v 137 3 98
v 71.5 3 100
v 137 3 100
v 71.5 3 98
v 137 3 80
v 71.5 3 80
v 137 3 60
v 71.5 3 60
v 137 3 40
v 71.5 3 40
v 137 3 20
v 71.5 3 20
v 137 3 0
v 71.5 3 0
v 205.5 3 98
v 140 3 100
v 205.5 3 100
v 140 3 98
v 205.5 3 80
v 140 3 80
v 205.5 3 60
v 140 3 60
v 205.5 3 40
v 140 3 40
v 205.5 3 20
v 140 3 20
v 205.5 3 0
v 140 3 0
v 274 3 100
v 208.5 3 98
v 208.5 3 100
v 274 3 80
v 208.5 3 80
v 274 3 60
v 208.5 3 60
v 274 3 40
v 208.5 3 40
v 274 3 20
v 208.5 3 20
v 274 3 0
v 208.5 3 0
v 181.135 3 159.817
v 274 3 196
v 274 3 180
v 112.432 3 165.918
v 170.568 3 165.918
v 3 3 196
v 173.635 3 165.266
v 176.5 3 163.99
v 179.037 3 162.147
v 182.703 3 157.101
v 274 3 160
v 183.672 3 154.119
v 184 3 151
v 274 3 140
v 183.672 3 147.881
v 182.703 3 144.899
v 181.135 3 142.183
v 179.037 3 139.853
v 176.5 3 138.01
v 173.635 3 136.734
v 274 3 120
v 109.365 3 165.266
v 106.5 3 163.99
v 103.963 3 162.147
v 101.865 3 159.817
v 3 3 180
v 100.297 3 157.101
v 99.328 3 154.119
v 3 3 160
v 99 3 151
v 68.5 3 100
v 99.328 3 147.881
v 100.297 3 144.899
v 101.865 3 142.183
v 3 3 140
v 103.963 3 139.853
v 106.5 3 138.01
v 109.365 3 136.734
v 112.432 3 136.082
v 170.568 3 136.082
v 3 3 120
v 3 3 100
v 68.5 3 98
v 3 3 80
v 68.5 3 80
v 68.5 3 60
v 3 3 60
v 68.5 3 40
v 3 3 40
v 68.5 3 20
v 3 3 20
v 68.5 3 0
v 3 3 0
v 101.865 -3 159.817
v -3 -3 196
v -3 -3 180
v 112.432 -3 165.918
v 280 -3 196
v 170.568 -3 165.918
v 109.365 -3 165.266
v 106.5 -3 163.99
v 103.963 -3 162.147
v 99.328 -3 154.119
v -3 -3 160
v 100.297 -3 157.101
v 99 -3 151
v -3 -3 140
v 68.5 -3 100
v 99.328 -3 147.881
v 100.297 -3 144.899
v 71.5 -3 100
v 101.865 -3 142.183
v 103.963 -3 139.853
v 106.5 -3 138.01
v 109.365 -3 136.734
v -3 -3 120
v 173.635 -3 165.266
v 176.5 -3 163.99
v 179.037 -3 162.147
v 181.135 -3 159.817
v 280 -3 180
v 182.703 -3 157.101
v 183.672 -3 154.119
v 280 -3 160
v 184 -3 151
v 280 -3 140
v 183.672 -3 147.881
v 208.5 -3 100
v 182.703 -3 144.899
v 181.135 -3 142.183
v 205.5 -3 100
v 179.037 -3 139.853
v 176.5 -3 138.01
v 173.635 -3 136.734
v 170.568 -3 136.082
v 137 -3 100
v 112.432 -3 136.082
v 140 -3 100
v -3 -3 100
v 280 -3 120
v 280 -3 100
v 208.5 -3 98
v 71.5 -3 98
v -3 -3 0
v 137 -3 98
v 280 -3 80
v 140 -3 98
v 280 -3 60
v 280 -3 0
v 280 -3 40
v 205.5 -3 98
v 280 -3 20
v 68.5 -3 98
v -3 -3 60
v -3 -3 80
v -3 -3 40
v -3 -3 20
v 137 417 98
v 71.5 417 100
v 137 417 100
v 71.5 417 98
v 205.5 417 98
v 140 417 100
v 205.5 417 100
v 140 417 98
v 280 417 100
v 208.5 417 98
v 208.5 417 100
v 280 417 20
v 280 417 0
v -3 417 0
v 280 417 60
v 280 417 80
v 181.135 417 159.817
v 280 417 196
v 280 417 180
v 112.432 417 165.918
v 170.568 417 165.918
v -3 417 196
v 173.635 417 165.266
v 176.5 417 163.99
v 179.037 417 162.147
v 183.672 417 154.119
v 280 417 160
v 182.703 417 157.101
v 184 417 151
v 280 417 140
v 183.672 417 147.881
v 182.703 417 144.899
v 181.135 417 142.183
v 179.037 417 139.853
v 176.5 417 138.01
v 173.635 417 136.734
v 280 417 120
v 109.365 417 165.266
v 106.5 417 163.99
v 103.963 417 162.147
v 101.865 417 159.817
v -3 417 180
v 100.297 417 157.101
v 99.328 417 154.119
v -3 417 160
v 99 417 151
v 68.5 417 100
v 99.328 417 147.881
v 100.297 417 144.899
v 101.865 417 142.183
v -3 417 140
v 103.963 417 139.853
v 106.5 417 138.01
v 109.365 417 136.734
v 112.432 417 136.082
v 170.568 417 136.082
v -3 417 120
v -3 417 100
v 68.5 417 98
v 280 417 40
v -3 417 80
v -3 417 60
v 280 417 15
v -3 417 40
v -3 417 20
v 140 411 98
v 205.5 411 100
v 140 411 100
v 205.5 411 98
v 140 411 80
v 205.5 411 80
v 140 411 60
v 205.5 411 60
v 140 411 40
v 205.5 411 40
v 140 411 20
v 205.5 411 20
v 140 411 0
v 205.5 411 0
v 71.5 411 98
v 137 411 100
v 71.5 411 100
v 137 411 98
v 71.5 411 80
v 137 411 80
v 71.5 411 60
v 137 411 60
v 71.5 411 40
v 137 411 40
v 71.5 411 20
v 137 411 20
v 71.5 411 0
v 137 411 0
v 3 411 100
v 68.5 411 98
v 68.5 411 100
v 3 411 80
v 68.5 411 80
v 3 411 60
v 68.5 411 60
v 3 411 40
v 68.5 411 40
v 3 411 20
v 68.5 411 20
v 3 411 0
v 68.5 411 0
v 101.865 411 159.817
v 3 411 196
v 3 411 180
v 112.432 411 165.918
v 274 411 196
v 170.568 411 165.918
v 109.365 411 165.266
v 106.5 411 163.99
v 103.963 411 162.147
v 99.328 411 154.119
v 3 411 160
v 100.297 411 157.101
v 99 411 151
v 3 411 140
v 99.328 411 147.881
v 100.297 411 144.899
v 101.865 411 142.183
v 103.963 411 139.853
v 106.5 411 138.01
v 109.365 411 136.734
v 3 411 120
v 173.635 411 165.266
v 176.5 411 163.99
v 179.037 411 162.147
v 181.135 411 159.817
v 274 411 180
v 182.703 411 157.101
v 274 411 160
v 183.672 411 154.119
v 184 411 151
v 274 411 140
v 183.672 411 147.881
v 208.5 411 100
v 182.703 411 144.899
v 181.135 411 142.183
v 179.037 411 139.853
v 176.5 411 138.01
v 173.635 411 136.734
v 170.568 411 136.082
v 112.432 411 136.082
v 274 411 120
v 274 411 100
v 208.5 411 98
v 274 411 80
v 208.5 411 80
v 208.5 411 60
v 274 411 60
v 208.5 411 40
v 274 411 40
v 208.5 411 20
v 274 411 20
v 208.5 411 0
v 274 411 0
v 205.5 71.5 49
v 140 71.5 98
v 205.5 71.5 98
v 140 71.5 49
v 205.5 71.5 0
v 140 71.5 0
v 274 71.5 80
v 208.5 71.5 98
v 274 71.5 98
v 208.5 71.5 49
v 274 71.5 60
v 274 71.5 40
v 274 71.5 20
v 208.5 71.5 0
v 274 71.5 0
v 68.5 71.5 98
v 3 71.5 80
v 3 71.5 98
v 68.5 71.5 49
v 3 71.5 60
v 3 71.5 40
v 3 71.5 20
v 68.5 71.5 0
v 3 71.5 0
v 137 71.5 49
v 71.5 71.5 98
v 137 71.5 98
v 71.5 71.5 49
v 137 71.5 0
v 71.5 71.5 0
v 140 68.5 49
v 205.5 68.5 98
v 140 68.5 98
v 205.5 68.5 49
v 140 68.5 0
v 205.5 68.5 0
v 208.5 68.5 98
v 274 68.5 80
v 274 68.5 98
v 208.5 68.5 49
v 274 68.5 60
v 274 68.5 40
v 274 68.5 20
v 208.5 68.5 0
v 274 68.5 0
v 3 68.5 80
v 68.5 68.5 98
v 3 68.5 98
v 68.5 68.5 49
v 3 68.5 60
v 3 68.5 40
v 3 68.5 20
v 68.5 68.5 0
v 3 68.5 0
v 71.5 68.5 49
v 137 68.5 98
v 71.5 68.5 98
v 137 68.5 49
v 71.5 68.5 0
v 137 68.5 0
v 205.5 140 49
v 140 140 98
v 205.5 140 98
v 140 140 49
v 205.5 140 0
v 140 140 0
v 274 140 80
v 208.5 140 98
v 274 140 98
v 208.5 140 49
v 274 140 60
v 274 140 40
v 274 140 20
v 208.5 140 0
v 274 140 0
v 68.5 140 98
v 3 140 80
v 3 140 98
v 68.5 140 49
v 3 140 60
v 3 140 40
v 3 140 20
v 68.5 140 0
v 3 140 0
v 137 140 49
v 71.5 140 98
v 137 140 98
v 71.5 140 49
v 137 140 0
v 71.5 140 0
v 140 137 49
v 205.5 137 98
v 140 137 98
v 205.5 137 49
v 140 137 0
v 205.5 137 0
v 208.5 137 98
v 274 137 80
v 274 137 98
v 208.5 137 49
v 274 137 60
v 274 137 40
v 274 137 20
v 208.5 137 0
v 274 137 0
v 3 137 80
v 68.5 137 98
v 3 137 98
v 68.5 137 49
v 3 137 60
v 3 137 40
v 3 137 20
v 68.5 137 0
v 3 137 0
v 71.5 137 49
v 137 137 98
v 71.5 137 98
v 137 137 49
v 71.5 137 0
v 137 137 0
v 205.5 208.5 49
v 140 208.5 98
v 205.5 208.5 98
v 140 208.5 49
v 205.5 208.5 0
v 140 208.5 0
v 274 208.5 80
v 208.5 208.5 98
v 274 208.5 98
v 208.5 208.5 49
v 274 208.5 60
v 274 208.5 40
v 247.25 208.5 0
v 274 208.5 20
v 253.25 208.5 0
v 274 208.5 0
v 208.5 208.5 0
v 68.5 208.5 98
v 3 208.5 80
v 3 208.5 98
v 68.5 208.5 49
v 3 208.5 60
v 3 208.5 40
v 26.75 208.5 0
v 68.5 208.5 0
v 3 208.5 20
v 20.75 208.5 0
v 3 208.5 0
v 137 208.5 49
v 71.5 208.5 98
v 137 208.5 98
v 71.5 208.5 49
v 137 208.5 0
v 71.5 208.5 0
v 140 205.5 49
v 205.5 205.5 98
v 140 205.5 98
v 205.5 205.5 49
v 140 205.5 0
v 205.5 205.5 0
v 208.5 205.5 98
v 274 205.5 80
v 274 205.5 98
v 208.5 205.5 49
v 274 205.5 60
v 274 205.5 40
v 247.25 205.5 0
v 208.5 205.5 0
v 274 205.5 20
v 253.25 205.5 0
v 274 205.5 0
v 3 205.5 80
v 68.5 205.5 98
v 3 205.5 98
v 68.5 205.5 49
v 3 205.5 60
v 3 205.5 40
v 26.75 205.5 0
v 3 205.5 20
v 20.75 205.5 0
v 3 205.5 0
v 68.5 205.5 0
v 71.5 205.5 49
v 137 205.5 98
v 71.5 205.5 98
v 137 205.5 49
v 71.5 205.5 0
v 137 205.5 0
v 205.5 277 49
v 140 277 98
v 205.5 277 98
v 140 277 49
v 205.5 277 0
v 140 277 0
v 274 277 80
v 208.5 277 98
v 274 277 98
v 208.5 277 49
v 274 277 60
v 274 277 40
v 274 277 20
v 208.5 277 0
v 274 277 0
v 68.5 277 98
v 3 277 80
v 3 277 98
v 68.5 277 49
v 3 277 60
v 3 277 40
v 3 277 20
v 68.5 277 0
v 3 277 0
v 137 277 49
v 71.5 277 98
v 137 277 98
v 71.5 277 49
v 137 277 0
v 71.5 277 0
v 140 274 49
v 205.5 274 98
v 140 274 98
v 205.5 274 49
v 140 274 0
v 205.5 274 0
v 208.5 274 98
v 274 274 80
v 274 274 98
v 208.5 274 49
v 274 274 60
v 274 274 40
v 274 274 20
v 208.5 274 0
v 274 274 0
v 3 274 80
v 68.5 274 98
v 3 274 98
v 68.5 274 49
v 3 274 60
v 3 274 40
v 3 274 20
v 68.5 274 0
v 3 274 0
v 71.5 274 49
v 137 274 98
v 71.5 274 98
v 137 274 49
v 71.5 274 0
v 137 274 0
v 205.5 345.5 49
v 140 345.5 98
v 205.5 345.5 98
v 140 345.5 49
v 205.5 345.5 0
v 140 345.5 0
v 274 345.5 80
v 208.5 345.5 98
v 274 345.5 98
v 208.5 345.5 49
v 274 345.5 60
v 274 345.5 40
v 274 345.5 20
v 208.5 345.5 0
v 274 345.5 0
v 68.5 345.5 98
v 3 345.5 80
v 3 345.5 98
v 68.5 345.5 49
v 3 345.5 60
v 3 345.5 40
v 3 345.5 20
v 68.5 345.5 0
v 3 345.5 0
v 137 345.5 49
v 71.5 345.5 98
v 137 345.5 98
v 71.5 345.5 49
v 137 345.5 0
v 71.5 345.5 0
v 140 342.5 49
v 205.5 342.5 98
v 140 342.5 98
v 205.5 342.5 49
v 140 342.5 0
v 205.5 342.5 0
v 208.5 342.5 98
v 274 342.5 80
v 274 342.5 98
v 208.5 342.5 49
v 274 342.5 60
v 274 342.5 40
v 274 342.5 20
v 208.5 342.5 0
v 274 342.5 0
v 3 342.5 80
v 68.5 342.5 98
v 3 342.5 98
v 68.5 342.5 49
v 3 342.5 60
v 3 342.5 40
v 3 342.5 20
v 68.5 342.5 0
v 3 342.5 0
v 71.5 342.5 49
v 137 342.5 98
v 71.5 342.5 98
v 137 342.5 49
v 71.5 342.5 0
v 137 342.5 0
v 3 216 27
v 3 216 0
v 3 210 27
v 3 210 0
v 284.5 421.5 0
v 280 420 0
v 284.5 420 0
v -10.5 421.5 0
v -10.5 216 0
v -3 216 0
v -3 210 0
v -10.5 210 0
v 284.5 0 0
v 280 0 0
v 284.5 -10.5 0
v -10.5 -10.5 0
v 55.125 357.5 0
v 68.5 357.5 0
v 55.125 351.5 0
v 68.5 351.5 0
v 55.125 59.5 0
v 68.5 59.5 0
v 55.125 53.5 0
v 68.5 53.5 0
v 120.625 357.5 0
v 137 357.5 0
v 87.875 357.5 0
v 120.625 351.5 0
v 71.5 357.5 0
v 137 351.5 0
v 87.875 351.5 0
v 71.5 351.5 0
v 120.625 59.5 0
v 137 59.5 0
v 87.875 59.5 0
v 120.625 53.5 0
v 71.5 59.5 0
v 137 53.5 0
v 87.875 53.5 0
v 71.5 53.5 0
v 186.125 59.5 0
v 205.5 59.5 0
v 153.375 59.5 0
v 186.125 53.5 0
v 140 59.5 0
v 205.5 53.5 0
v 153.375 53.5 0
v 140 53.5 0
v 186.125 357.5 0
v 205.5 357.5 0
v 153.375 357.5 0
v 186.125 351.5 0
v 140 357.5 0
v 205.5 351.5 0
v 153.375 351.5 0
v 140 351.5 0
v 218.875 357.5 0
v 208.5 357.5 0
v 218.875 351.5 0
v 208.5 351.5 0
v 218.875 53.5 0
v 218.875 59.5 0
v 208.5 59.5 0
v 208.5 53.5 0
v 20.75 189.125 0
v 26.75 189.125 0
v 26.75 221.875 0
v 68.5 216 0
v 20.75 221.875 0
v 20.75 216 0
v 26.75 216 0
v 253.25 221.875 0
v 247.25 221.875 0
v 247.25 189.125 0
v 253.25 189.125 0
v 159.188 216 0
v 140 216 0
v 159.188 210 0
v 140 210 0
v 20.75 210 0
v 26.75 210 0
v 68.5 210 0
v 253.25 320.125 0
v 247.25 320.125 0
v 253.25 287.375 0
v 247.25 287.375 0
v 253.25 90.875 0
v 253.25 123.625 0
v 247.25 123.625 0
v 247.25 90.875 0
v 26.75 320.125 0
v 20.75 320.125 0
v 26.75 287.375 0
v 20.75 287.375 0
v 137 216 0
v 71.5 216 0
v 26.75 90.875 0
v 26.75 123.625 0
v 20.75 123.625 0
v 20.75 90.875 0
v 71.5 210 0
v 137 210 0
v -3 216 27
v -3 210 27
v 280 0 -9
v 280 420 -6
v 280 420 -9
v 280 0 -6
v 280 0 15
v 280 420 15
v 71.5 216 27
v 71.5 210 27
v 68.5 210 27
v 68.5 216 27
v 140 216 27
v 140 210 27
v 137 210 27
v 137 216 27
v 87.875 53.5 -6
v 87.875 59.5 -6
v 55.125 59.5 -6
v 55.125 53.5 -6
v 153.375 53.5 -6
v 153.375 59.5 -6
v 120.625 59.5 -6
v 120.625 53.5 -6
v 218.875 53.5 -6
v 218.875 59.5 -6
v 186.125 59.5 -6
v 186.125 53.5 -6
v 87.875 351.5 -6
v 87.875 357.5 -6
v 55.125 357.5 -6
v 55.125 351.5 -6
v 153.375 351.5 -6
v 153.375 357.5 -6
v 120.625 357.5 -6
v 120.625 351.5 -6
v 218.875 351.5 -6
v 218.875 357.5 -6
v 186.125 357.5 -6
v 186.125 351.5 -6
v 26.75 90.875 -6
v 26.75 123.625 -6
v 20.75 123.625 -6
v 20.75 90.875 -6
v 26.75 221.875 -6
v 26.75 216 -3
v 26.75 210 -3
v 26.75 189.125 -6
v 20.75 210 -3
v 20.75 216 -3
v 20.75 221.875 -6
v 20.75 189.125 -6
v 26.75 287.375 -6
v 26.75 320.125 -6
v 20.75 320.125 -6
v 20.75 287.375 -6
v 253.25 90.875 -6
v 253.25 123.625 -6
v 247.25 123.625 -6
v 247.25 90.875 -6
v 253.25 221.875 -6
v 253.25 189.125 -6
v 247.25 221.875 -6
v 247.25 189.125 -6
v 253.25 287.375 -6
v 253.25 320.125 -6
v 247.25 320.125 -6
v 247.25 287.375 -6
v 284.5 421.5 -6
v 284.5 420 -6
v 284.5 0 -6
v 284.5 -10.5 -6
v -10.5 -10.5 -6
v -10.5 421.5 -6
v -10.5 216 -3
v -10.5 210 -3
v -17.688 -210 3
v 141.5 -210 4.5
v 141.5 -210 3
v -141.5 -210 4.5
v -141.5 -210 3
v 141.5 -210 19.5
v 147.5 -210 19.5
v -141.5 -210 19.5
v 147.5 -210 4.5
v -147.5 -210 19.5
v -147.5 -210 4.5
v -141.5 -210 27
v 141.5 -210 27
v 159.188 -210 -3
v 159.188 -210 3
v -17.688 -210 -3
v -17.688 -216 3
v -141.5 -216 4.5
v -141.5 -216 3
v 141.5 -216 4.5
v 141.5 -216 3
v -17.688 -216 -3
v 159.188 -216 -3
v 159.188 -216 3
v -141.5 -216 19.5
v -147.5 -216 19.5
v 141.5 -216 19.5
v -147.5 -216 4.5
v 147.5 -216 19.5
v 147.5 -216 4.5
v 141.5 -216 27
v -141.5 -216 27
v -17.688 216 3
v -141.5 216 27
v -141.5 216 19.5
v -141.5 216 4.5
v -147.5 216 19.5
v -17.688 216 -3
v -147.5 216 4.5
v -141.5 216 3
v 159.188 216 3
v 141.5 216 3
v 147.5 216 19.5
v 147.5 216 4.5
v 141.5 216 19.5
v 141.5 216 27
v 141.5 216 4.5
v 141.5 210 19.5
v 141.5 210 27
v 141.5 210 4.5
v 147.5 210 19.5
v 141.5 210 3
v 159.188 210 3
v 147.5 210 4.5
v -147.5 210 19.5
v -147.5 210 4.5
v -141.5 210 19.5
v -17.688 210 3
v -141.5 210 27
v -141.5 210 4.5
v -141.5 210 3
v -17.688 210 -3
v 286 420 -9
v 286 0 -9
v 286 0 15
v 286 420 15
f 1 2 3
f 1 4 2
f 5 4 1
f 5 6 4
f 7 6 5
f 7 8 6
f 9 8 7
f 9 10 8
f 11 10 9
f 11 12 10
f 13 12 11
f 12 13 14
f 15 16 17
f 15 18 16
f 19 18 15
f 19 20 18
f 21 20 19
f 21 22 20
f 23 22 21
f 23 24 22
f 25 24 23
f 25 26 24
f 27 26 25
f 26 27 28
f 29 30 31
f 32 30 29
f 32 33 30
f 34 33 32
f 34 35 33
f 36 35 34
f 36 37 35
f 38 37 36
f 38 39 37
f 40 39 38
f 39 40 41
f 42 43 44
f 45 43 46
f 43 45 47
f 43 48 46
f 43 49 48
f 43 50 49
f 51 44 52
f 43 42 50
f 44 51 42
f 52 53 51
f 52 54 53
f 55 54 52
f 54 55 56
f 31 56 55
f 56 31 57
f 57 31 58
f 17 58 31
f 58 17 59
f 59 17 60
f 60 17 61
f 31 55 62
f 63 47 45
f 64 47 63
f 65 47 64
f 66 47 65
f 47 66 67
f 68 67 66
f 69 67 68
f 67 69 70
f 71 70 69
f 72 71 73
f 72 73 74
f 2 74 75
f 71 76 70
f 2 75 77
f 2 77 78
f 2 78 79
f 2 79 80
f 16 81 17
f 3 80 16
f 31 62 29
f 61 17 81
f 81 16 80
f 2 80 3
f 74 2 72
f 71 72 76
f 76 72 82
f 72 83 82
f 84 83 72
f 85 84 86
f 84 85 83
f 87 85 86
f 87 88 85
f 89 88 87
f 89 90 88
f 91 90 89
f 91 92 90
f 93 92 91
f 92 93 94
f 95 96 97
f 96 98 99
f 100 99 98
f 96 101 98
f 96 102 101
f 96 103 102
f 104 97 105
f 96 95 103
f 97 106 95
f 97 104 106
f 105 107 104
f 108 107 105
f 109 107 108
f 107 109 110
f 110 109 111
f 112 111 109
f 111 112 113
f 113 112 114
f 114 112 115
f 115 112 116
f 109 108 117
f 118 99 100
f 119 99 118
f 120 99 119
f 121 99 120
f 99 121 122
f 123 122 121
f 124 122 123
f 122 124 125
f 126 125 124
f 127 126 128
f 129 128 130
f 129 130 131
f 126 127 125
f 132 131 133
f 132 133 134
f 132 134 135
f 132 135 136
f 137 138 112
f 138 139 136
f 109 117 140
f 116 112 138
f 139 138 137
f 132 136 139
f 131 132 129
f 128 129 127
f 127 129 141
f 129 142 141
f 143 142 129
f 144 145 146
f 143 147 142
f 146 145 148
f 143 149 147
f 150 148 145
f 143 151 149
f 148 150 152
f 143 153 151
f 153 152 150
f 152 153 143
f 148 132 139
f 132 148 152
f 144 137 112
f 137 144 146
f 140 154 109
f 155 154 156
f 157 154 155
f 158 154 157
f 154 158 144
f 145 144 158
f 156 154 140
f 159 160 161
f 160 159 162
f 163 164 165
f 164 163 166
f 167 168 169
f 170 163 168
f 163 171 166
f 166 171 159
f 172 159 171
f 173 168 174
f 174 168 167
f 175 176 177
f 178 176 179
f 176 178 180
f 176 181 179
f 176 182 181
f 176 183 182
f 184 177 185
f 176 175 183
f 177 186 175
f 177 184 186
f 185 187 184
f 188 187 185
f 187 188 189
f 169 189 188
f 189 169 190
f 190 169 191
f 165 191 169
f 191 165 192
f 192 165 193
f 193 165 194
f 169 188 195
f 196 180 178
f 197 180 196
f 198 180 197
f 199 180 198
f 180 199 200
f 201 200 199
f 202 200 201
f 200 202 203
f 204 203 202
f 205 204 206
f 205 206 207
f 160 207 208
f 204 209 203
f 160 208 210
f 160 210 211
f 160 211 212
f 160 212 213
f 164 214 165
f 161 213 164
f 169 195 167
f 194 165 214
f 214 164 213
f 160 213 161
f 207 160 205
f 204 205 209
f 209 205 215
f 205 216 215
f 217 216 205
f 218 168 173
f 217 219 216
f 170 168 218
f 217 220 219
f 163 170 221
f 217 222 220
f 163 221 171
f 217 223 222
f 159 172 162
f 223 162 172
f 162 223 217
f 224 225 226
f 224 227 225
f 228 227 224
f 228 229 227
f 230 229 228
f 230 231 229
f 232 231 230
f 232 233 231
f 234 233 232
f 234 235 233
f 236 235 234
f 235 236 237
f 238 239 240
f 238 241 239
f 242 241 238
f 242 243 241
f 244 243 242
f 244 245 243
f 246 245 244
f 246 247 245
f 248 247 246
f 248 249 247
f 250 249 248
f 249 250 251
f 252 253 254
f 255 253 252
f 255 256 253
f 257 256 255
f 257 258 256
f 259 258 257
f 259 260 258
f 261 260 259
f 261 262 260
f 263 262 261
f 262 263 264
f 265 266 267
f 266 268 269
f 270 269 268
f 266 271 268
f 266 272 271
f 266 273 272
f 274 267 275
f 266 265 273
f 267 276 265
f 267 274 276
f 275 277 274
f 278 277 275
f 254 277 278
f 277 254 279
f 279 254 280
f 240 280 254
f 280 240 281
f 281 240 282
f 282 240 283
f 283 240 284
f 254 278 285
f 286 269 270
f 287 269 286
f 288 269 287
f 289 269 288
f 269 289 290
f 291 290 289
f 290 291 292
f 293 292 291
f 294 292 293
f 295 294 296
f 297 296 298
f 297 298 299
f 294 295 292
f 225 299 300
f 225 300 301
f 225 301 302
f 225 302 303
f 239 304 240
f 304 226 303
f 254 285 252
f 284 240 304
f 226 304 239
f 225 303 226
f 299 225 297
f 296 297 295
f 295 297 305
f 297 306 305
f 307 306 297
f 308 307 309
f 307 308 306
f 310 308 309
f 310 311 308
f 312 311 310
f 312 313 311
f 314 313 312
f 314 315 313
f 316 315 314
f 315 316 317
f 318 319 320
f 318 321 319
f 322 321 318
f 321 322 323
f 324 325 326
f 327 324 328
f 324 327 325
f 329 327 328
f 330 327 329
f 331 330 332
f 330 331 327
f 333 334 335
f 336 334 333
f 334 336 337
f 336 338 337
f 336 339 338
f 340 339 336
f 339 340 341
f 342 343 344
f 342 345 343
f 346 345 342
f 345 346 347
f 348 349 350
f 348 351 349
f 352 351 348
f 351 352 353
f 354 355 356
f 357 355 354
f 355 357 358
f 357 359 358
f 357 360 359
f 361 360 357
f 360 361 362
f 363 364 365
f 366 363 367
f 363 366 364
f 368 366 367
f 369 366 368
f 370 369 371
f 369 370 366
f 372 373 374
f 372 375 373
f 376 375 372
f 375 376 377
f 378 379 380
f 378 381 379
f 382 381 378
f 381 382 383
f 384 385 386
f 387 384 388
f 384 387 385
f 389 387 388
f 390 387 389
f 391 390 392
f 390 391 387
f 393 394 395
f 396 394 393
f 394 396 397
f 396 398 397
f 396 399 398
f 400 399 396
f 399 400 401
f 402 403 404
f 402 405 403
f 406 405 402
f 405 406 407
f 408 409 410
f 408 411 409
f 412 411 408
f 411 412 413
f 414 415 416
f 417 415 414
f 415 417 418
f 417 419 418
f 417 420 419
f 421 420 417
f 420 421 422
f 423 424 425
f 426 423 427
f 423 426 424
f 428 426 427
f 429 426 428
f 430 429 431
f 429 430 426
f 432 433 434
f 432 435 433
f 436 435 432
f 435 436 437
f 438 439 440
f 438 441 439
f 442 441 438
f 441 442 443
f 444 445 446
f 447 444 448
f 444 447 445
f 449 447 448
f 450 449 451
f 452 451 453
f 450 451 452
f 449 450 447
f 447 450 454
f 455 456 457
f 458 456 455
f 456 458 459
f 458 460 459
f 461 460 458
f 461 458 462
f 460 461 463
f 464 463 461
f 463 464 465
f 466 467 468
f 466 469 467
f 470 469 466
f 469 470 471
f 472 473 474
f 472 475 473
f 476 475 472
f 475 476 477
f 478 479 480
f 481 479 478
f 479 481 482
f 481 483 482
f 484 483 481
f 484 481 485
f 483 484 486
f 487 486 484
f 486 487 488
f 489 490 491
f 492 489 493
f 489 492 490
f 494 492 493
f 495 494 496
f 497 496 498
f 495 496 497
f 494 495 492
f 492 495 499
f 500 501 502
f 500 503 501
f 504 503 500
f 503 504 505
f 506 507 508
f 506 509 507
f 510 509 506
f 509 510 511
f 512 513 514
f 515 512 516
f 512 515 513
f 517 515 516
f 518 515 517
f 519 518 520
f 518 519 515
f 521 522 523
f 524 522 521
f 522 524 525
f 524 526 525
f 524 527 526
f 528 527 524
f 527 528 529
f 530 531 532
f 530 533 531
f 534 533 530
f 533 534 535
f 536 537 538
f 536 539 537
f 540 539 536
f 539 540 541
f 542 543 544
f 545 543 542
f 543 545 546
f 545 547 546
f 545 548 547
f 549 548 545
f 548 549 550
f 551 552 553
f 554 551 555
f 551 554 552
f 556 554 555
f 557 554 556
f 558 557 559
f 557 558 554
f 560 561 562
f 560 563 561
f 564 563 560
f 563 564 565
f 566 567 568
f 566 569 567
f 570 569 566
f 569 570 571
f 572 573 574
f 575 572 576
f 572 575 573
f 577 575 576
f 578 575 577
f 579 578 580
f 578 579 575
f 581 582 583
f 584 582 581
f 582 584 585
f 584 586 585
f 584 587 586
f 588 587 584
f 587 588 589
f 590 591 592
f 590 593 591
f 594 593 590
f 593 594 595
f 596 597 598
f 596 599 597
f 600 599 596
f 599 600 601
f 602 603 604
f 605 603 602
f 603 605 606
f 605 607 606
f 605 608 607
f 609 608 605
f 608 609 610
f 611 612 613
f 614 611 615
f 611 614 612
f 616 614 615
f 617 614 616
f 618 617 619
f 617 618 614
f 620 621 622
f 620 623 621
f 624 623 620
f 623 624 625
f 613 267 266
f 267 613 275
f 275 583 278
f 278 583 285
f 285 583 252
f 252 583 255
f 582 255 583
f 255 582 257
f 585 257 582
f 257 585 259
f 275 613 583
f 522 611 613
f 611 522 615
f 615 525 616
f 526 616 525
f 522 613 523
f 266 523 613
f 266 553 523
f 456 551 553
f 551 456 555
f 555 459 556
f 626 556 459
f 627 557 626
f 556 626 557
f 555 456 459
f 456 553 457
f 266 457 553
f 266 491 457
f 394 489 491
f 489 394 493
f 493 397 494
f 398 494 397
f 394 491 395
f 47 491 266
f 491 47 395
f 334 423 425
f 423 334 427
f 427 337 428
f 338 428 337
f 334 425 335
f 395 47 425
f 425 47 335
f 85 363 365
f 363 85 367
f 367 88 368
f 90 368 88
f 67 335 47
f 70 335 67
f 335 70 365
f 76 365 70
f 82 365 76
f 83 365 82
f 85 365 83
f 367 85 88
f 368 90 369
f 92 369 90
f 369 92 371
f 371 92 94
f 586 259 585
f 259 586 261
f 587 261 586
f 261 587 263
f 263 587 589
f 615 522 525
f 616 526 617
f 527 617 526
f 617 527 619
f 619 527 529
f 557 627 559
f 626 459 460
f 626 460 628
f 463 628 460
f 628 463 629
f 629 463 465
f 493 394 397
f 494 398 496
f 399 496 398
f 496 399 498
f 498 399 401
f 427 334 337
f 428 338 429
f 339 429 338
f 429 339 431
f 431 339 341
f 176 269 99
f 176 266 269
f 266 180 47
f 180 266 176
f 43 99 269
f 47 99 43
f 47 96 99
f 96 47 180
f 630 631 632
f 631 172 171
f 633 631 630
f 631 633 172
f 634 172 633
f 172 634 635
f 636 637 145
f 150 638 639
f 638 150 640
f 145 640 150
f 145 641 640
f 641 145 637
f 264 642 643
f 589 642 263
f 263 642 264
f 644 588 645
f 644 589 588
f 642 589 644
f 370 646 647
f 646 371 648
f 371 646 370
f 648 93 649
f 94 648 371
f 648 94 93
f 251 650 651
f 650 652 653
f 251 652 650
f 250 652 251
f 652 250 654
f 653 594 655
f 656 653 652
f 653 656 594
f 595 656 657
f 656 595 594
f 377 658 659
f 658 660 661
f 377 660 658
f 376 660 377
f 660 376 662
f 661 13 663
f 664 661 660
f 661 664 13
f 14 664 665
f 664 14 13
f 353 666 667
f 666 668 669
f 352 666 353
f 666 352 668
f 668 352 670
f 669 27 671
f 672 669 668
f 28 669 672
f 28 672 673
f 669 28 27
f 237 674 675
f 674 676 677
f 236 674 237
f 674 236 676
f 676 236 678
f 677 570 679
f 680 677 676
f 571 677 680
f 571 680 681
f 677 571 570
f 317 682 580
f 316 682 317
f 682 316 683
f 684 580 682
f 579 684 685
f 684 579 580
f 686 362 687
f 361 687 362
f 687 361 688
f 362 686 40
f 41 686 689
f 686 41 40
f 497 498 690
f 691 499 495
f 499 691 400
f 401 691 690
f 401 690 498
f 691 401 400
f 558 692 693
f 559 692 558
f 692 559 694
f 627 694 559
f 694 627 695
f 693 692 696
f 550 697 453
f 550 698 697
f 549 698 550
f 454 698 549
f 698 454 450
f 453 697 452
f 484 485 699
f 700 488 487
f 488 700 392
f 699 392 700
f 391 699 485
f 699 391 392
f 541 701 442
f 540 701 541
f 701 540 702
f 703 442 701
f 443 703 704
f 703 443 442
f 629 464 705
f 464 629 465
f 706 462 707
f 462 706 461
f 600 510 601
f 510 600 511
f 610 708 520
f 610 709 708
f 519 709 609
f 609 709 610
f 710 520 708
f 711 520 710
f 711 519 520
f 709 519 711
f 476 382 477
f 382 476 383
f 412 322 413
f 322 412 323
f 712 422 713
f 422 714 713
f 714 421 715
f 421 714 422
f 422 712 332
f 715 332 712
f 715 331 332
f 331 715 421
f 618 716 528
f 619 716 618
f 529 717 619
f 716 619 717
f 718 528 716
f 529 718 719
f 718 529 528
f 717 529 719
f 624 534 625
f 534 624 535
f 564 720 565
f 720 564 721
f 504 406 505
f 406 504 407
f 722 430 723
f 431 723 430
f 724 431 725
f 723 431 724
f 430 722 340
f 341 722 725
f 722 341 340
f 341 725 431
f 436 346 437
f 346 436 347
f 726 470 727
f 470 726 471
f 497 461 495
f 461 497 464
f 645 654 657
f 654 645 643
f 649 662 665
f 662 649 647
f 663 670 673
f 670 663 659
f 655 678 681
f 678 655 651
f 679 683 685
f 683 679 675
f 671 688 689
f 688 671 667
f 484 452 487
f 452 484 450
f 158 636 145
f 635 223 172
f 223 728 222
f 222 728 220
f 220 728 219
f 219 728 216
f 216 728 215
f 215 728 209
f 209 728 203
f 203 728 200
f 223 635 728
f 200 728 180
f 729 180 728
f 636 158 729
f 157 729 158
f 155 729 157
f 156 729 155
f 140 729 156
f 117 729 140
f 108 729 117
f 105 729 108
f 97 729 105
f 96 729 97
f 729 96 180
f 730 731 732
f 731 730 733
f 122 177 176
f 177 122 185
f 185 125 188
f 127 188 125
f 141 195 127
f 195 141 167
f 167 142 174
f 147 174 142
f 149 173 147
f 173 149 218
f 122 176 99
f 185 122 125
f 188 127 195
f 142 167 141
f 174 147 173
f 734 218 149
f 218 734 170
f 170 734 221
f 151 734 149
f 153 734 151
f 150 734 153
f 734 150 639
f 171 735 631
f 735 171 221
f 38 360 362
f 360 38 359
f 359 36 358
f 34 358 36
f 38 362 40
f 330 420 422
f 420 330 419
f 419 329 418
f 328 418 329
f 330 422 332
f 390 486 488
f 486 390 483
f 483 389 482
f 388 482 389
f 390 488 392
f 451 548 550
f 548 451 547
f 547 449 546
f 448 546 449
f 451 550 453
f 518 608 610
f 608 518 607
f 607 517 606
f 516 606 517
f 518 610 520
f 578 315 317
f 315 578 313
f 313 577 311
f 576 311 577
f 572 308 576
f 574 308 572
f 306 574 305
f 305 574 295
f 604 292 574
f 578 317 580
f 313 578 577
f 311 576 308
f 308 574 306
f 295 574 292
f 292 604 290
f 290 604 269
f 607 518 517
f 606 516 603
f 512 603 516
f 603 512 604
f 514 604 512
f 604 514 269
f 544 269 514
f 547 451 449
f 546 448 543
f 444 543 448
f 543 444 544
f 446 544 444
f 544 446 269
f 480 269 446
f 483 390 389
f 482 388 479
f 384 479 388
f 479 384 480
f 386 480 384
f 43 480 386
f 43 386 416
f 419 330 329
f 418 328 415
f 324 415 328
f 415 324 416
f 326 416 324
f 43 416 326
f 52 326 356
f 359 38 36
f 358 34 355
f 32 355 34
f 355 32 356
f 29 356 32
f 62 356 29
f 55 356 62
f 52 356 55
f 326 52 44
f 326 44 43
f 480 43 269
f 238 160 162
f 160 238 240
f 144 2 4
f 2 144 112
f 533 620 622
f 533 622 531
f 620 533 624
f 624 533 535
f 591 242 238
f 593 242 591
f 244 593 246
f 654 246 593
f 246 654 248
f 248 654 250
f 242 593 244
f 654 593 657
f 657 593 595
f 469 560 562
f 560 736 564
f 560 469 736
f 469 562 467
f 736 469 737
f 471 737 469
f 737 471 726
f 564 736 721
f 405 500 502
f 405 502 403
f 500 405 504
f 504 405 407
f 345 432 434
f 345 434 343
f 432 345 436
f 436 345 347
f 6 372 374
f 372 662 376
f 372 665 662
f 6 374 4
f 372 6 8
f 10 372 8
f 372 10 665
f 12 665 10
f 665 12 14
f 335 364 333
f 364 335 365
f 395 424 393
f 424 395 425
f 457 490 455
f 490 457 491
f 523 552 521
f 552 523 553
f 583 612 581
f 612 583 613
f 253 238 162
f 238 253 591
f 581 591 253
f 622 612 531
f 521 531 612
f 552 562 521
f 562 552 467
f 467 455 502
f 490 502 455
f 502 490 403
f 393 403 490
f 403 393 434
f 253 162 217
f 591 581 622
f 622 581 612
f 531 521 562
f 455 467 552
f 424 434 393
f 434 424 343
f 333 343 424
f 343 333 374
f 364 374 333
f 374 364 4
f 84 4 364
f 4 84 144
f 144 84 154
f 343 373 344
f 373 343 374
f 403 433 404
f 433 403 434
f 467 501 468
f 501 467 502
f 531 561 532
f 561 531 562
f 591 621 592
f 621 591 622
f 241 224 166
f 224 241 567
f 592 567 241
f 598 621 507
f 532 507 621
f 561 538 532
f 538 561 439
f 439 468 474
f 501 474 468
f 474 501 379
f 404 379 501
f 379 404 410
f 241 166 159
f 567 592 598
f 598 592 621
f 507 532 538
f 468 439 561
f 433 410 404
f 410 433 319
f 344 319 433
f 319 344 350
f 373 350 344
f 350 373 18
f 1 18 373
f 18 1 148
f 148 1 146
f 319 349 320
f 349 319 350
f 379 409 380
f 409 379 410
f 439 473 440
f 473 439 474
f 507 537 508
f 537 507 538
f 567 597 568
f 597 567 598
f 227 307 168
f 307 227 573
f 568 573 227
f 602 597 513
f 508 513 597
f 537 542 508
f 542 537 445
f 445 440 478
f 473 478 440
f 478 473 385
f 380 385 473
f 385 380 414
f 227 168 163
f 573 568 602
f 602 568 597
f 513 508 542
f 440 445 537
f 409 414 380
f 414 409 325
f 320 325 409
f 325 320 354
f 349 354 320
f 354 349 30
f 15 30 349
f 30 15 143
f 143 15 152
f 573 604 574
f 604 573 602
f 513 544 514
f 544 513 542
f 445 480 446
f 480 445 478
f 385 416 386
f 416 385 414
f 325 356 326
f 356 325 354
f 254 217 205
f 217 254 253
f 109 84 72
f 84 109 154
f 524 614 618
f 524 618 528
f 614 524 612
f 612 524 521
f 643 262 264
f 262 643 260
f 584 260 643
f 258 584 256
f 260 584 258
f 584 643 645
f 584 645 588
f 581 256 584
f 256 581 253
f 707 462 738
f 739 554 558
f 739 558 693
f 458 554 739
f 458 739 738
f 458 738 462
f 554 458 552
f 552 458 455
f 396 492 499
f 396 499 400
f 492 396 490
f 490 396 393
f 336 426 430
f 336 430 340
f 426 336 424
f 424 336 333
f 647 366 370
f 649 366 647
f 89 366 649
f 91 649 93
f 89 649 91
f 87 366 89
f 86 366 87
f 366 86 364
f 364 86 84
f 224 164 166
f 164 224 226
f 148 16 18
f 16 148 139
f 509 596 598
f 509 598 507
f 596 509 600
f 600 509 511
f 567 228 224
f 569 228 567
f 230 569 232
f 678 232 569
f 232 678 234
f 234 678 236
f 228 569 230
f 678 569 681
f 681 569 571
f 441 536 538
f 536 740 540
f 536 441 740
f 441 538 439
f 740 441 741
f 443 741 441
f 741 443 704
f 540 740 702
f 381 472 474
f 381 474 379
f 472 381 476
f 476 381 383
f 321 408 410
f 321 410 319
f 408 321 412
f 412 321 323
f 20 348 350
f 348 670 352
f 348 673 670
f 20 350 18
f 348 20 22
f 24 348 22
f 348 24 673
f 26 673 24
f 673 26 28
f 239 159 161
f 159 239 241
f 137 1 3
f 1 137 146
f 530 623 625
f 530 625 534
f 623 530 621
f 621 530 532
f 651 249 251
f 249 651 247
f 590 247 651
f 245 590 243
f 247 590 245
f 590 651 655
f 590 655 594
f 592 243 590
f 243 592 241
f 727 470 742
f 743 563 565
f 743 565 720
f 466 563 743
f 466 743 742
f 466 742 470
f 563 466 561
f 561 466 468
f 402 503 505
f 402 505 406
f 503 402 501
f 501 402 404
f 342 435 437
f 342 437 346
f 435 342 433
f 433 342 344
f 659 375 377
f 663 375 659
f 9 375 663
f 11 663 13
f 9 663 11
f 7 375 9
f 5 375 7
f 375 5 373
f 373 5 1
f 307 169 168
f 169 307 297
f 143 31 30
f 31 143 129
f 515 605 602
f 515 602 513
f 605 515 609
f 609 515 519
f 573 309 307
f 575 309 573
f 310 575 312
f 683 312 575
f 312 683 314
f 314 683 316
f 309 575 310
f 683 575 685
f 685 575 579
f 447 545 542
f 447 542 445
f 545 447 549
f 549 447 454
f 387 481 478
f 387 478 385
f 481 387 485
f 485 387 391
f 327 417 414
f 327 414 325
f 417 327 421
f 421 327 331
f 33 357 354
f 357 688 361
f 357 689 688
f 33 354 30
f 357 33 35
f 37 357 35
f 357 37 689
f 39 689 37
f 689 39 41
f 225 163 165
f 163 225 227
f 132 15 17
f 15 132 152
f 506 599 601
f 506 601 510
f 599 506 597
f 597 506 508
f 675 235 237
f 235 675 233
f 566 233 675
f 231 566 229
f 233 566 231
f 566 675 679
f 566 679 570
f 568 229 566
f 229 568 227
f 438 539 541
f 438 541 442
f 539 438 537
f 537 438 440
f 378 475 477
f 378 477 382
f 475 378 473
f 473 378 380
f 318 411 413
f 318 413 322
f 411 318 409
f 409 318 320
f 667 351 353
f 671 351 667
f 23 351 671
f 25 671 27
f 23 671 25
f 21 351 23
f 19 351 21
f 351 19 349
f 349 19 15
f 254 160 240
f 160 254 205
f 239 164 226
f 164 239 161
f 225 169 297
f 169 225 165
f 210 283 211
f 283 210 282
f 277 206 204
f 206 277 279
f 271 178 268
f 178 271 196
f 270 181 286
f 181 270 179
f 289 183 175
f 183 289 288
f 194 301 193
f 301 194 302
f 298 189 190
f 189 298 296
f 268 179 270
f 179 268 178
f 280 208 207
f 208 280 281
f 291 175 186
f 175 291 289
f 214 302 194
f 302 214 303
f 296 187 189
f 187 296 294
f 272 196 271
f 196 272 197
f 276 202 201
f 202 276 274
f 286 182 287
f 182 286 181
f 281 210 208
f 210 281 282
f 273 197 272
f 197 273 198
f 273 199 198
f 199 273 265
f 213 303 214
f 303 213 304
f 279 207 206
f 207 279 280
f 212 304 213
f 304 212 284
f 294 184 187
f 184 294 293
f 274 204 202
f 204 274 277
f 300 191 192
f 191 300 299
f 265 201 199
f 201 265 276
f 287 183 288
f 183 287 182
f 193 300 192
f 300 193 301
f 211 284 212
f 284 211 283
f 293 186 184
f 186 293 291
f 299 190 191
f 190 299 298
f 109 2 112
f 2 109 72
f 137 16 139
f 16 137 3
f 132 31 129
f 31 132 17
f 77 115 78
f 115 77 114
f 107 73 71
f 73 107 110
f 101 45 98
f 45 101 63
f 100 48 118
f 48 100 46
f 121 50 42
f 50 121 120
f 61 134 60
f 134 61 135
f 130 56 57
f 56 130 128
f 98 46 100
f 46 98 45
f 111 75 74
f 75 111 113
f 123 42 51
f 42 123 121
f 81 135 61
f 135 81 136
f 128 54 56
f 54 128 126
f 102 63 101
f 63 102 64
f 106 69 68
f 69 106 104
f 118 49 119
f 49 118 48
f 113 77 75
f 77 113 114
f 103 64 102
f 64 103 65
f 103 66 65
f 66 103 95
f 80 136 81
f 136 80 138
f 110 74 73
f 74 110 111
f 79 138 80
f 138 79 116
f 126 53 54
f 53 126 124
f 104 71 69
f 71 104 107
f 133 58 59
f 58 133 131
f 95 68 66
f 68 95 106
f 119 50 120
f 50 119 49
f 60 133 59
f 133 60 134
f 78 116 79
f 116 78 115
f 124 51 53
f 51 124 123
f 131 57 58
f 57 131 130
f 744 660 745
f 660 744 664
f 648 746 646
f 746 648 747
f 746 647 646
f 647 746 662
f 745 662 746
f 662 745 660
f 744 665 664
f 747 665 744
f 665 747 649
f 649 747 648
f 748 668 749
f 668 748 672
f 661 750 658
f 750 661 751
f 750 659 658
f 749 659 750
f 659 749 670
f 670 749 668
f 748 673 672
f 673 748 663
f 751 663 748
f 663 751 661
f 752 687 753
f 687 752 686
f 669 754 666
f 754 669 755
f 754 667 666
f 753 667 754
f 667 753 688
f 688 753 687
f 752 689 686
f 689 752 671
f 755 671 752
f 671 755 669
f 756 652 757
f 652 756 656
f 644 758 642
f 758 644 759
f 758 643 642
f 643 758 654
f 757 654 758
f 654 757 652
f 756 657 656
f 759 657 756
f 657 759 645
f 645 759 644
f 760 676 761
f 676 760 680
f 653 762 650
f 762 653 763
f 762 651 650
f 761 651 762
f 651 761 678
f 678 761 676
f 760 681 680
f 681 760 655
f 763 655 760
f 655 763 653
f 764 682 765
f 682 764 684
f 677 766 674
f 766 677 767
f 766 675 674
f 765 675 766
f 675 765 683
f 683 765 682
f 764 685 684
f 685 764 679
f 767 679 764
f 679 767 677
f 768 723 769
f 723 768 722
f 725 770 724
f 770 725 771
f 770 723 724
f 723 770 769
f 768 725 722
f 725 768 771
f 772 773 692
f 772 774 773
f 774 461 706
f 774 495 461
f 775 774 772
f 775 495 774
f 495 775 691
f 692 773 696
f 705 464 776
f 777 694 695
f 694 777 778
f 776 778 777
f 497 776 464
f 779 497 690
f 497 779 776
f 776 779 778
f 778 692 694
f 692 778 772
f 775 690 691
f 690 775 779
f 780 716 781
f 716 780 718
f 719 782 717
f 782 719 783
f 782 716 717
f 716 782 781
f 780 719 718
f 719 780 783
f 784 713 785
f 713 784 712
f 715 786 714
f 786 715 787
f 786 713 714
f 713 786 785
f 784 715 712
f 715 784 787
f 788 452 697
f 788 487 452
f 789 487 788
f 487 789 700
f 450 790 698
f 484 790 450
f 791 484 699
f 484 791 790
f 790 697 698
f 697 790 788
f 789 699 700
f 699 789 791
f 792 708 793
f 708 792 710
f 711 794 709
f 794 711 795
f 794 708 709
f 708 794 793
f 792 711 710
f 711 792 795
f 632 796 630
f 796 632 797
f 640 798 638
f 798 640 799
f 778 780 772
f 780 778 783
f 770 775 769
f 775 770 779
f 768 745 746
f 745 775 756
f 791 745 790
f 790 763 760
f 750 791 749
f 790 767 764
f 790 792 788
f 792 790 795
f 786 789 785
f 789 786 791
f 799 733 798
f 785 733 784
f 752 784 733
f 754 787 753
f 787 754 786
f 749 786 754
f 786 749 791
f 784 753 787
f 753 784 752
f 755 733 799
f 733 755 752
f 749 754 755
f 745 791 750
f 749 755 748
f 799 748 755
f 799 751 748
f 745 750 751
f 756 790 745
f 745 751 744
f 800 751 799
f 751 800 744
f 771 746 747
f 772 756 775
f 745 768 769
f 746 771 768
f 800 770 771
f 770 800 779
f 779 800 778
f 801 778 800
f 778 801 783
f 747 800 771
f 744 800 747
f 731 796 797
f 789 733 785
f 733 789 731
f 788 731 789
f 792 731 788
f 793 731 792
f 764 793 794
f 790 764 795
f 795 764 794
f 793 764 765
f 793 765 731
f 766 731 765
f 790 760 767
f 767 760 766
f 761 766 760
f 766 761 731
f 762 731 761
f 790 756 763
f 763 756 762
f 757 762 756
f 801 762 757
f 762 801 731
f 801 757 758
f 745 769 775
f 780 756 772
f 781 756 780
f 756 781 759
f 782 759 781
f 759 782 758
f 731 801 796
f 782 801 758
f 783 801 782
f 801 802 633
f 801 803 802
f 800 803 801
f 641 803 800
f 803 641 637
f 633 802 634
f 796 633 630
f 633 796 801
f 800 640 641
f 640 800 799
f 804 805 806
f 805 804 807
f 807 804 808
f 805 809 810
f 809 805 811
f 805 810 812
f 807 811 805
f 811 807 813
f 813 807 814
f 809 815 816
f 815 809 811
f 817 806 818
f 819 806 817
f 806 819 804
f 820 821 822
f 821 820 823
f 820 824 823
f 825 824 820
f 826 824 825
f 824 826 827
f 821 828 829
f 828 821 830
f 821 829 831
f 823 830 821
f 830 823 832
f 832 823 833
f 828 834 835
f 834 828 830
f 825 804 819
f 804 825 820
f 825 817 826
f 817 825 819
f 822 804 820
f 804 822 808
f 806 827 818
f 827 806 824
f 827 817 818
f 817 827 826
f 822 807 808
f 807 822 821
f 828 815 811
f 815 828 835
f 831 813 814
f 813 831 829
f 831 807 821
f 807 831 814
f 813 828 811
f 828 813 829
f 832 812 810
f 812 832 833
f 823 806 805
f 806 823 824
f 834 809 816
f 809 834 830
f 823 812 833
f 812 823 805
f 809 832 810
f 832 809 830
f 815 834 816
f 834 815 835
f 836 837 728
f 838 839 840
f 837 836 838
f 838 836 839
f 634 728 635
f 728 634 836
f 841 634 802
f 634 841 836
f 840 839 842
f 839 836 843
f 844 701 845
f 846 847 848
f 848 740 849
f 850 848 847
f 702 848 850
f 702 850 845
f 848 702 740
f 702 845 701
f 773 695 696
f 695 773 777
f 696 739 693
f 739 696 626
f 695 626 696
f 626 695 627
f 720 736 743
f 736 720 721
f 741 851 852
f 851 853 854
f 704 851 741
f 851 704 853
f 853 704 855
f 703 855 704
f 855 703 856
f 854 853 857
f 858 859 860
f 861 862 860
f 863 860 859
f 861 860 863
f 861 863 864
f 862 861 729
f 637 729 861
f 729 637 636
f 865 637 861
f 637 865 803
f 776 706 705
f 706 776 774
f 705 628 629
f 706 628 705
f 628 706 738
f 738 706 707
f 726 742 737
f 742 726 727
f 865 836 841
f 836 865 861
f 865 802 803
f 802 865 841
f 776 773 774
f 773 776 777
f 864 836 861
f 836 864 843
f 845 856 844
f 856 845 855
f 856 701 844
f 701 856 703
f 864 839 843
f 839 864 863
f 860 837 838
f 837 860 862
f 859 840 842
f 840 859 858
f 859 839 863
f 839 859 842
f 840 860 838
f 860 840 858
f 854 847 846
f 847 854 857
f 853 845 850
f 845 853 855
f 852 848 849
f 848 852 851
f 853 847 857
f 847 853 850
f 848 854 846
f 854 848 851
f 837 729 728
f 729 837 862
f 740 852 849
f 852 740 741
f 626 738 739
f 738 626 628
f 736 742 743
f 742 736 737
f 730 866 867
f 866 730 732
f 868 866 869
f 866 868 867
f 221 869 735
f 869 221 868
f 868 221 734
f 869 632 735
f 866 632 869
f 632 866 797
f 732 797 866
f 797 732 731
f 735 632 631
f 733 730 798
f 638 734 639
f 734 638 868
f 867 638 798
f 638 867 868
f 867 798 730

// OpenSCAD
//layout=[3,4];
//layout=[2,3];
layout=[4,6];
//layout=[2,1];
thickness=6;
div_thickness=3;
ct=thickness;
ch=20;
lid_height=30;
material_depth=304;
material_width=609.6;

upright=true;
handle_width=85;

// champain bottle
bottle_height=299;
bottle_width=85;

// 750ml bottle
//bottle_height=291;
//bottle_width=80;

// 12oz normal
bottle_height=196;
bottle_width=65.5;

// 12oz tall
//bottle_height=226;
//bottle_width=61;

// 16oz swingtop
//bottle_height=256;
//bottle_width=71;

div_height=bottle_height/2;
side_length=layout[1]*bottle_width+
             (layout[1]-1)*div_thickness+
             thickness*2;
end_length=layout[0]*bottle_width+
             (layout[0]-1)*div_thickness+
             thickness*2;

//%cube([300, 600, 6]);

case();
//bottles();
lid();
//bottom();
//lid_end();
//bottles24();
//end();
//inside();
//outside();
//divider();
//lid();
//lid_end();
//champagne_layout();

module champagne_layout(){
bottle_height=299;
bottle_width=85;
  %cube([300, 600, 6],center=true);
//  translate([-bottle_height/2,-120,0]) rotate([0,90,0]) outside();
  translate([-bottle_height/2,-160,0]) rotate([90,0,90]) divider();
}

module model(){
  translate([0,0,bottle_height+thickness]) rotate([0,180,0]) lid();
  case();
  lid();
}

module lid(){
//  translate([side_length/2,end_length/2,0]){
  bottom();
  %translate([-thickness*1.5,side_length/2,0]) rotate([0,90,0]) lid_side();
  translate([end_length,side_length/2,0]) rotate([0,90,0]) lid_side();
  for(Y=[-1,1]) translate([0,(side_length+thickness)/2*Y,(lid_height-thickness)/2]) rotate([-90,0,0]) lid_end();
//  }
}

module lid_end(){
    tabs=4;
    union(){
      translate([0,-thickness/2,0])
    cube([end_length, lid_height-thickness,thickness], center=true);

    for(X=[0:1:tabs])
      translate([X*(end_length/(tabs*2)), (lid_height-thickness)/2,0]) 
        cube([end_length/(tabs*2), ct, thickness], center=true);
    for(X=[-1,1])
      translate([(end_length+thickness)/2*X,0,0])
        cube([ct, lid_height/2, thickness], center=true);
    }
}

module lid_side(){
  difference(){
    union(){
      translate([-thickness/2,0,0])
      cube([lid_height-thickness,side_length,thickness], center=true);
//    for(Y=[-1.5,0,1.5])
//      translate([(lid_height-thickness)/2, bottle_width*Y, 0])
//        cube([ct, bottle_width/2, thickness], center=true);
    }
//    for(Y=[-1,1])
//      translate([0,(bottle_width*2+thickness*3)*Y,0])
//        cube([lid_height/2, ct, thickness+2], center=true);
  }
}


module bottom(){
  translate([(end_length/2)-thickness*.75,(side_length/2)-thickness*.75,-thickness/2])
  difference(){
    cube([end_length+thickness*2, side_length+thickness*2, thickness], center=true);
    for(Y=[-1,1], X=[-1,0,1])
      translate([bottle_width*X, (bottle_width*2+thickness*3)*Y,0]) 
        cube([bottle_width/2, ct, thickness+2], center=true);
    for(X=[-1,1], Y=[-1.5,0,1.5])
      translate([(bottle_width*1.5+thickness*2.5)*X, bottle_width*Y,0]) 
        cube([ct, bottle_width/2, thickness+2], center=true);
  }
}

module case(){
  translate([0, -thickness/2, 0]) outside();
  translate([end_length-thickness, -thickness/2, 0]) outside();
  if(upright){
    for(X=[1:1:layout[0]-1])
      translate([(bottle_width+div_thickness)*X, 0, 0])
        inside();
  
    for(Y=[1:1:layout[1]-1])
      translate([-thickness/2, div_thickness/2+(bottle_width+  div_thickness)*Y,0])
        divider();
  }
  translate([0, side_length-thickness, 0]) end();
  translate([0, 0, 0]) end();
}

module outside(){
  difference(){
    translate([-thickness/2,0,0])
      cube([thickness, side_length, bottle_height]);
    for(Y=[thickness/2,side_length-thickness/2], Z=[30:40:bottle_height])
      translate([0, Y, Z]) 
        cube([thickness+2, ct, ch], center=true);
    for(Y=[1:1:layout[1]-1], Z=[30:40:div_height+1])
      translate([0, -div_thickness/2+thickness+(bottle_width+div_thickness)*Y,Z]) 
        cube([thickness+2, div_thickness, ch], center=true);
  }
}

module inside(){
  difference(){
    translate([0,-thickness/2,0]) 
      cube([div_thickness, side_length, div_height]);
    
    for(Y=[1:1:layout[1]-1])
    translate([0, div_thickness/2+(bottle_width+div_thickness)*Y,div_height*.25])
      cube([thickness+2, div_thickness, div_height/2], center=true);
    for(Y=[0,side_length-thickness], Z=[30:40:bottle_height])
      translate([0, Y, Z]) 
        cube([thickness+2, ct, ch], center=true);
  }
}

module end(){
  difference(){
    translate([-thickness/2,-thickness/2,0]) 
      cube([end_length, thickness, bottle_height],center=false);
     translate([end_length/2, 0, 0])
    hull()
      for(X=[-1,1]) rotate([90,0,0]) translate([(handle_width/2-15)*X, bottle_height-lid_height-15, 0]) 
        cylinder(d=30,h=thickness+2, center=true);
    for(X=[0,end_length-thickness], Z=[10:40:bottle_height])
      translate([X,0,Z]) 
        cube([ct, thickness+2, ch], center=true);
    
    if(upright){
      for(X=[1:1:layout[0]-1], Z=[10:40:div_height])
        translate([div_thickness/2+(bottle_width+div_thickness)*X, 0, Z])
        cube([div_thickness, thickness+2, ch], center=true);
    }
  }
}

module divider(){
  difference(){
    translate([0,-div_thickness/2,0]) 
      cube([end_length, div_thickness, div_height]);
    for(X=[thickness/2,end_length-thickness/2], Z=[10:40:div_height])
      translate([X,0,Z]) 
        cube([ct, thickness+2, ch], center=true);
    for(X=[1:1:layout[0]-1]) 
      translate([thickness/2+div_thickness/2+(bottle_width+div_thickness)*X, 0, div_height*.75]) 
        cube([div_thickness, thickness+2, div_height/2], center=true);
  }
}

module bottles24(){
  for(X=[0:1:layout[0]-1], Y=[0:1:layout[1]-1]) 
    translate([((bottle_width+thickness)/2)+(bottle_width+div_thickness)*X,(bottle_width+thickness)/2+(bottle_width+div_thickness)*Y,0]) 
      %bottle();
}

module bottles(){
  translate([thickness/2+bottle_width/2, thickness/2+bottle_width/2, 0])
  for(X=[0:1:layout[0]-1], Y=[0:1:layout[1]-1]) 
    translate([(bottle_width+div_thickness)*X,(bottle_width+div_thickness)*Y,0]) 
      %bottle();
}

module bottle(){
  cylinder(d=bottle_width, h=bottle_height*.50);
  translate([0,0,bottle_height*.50]) cylinder(d1=bottle_width, d2=26, h=bottle_height*.50);
}
